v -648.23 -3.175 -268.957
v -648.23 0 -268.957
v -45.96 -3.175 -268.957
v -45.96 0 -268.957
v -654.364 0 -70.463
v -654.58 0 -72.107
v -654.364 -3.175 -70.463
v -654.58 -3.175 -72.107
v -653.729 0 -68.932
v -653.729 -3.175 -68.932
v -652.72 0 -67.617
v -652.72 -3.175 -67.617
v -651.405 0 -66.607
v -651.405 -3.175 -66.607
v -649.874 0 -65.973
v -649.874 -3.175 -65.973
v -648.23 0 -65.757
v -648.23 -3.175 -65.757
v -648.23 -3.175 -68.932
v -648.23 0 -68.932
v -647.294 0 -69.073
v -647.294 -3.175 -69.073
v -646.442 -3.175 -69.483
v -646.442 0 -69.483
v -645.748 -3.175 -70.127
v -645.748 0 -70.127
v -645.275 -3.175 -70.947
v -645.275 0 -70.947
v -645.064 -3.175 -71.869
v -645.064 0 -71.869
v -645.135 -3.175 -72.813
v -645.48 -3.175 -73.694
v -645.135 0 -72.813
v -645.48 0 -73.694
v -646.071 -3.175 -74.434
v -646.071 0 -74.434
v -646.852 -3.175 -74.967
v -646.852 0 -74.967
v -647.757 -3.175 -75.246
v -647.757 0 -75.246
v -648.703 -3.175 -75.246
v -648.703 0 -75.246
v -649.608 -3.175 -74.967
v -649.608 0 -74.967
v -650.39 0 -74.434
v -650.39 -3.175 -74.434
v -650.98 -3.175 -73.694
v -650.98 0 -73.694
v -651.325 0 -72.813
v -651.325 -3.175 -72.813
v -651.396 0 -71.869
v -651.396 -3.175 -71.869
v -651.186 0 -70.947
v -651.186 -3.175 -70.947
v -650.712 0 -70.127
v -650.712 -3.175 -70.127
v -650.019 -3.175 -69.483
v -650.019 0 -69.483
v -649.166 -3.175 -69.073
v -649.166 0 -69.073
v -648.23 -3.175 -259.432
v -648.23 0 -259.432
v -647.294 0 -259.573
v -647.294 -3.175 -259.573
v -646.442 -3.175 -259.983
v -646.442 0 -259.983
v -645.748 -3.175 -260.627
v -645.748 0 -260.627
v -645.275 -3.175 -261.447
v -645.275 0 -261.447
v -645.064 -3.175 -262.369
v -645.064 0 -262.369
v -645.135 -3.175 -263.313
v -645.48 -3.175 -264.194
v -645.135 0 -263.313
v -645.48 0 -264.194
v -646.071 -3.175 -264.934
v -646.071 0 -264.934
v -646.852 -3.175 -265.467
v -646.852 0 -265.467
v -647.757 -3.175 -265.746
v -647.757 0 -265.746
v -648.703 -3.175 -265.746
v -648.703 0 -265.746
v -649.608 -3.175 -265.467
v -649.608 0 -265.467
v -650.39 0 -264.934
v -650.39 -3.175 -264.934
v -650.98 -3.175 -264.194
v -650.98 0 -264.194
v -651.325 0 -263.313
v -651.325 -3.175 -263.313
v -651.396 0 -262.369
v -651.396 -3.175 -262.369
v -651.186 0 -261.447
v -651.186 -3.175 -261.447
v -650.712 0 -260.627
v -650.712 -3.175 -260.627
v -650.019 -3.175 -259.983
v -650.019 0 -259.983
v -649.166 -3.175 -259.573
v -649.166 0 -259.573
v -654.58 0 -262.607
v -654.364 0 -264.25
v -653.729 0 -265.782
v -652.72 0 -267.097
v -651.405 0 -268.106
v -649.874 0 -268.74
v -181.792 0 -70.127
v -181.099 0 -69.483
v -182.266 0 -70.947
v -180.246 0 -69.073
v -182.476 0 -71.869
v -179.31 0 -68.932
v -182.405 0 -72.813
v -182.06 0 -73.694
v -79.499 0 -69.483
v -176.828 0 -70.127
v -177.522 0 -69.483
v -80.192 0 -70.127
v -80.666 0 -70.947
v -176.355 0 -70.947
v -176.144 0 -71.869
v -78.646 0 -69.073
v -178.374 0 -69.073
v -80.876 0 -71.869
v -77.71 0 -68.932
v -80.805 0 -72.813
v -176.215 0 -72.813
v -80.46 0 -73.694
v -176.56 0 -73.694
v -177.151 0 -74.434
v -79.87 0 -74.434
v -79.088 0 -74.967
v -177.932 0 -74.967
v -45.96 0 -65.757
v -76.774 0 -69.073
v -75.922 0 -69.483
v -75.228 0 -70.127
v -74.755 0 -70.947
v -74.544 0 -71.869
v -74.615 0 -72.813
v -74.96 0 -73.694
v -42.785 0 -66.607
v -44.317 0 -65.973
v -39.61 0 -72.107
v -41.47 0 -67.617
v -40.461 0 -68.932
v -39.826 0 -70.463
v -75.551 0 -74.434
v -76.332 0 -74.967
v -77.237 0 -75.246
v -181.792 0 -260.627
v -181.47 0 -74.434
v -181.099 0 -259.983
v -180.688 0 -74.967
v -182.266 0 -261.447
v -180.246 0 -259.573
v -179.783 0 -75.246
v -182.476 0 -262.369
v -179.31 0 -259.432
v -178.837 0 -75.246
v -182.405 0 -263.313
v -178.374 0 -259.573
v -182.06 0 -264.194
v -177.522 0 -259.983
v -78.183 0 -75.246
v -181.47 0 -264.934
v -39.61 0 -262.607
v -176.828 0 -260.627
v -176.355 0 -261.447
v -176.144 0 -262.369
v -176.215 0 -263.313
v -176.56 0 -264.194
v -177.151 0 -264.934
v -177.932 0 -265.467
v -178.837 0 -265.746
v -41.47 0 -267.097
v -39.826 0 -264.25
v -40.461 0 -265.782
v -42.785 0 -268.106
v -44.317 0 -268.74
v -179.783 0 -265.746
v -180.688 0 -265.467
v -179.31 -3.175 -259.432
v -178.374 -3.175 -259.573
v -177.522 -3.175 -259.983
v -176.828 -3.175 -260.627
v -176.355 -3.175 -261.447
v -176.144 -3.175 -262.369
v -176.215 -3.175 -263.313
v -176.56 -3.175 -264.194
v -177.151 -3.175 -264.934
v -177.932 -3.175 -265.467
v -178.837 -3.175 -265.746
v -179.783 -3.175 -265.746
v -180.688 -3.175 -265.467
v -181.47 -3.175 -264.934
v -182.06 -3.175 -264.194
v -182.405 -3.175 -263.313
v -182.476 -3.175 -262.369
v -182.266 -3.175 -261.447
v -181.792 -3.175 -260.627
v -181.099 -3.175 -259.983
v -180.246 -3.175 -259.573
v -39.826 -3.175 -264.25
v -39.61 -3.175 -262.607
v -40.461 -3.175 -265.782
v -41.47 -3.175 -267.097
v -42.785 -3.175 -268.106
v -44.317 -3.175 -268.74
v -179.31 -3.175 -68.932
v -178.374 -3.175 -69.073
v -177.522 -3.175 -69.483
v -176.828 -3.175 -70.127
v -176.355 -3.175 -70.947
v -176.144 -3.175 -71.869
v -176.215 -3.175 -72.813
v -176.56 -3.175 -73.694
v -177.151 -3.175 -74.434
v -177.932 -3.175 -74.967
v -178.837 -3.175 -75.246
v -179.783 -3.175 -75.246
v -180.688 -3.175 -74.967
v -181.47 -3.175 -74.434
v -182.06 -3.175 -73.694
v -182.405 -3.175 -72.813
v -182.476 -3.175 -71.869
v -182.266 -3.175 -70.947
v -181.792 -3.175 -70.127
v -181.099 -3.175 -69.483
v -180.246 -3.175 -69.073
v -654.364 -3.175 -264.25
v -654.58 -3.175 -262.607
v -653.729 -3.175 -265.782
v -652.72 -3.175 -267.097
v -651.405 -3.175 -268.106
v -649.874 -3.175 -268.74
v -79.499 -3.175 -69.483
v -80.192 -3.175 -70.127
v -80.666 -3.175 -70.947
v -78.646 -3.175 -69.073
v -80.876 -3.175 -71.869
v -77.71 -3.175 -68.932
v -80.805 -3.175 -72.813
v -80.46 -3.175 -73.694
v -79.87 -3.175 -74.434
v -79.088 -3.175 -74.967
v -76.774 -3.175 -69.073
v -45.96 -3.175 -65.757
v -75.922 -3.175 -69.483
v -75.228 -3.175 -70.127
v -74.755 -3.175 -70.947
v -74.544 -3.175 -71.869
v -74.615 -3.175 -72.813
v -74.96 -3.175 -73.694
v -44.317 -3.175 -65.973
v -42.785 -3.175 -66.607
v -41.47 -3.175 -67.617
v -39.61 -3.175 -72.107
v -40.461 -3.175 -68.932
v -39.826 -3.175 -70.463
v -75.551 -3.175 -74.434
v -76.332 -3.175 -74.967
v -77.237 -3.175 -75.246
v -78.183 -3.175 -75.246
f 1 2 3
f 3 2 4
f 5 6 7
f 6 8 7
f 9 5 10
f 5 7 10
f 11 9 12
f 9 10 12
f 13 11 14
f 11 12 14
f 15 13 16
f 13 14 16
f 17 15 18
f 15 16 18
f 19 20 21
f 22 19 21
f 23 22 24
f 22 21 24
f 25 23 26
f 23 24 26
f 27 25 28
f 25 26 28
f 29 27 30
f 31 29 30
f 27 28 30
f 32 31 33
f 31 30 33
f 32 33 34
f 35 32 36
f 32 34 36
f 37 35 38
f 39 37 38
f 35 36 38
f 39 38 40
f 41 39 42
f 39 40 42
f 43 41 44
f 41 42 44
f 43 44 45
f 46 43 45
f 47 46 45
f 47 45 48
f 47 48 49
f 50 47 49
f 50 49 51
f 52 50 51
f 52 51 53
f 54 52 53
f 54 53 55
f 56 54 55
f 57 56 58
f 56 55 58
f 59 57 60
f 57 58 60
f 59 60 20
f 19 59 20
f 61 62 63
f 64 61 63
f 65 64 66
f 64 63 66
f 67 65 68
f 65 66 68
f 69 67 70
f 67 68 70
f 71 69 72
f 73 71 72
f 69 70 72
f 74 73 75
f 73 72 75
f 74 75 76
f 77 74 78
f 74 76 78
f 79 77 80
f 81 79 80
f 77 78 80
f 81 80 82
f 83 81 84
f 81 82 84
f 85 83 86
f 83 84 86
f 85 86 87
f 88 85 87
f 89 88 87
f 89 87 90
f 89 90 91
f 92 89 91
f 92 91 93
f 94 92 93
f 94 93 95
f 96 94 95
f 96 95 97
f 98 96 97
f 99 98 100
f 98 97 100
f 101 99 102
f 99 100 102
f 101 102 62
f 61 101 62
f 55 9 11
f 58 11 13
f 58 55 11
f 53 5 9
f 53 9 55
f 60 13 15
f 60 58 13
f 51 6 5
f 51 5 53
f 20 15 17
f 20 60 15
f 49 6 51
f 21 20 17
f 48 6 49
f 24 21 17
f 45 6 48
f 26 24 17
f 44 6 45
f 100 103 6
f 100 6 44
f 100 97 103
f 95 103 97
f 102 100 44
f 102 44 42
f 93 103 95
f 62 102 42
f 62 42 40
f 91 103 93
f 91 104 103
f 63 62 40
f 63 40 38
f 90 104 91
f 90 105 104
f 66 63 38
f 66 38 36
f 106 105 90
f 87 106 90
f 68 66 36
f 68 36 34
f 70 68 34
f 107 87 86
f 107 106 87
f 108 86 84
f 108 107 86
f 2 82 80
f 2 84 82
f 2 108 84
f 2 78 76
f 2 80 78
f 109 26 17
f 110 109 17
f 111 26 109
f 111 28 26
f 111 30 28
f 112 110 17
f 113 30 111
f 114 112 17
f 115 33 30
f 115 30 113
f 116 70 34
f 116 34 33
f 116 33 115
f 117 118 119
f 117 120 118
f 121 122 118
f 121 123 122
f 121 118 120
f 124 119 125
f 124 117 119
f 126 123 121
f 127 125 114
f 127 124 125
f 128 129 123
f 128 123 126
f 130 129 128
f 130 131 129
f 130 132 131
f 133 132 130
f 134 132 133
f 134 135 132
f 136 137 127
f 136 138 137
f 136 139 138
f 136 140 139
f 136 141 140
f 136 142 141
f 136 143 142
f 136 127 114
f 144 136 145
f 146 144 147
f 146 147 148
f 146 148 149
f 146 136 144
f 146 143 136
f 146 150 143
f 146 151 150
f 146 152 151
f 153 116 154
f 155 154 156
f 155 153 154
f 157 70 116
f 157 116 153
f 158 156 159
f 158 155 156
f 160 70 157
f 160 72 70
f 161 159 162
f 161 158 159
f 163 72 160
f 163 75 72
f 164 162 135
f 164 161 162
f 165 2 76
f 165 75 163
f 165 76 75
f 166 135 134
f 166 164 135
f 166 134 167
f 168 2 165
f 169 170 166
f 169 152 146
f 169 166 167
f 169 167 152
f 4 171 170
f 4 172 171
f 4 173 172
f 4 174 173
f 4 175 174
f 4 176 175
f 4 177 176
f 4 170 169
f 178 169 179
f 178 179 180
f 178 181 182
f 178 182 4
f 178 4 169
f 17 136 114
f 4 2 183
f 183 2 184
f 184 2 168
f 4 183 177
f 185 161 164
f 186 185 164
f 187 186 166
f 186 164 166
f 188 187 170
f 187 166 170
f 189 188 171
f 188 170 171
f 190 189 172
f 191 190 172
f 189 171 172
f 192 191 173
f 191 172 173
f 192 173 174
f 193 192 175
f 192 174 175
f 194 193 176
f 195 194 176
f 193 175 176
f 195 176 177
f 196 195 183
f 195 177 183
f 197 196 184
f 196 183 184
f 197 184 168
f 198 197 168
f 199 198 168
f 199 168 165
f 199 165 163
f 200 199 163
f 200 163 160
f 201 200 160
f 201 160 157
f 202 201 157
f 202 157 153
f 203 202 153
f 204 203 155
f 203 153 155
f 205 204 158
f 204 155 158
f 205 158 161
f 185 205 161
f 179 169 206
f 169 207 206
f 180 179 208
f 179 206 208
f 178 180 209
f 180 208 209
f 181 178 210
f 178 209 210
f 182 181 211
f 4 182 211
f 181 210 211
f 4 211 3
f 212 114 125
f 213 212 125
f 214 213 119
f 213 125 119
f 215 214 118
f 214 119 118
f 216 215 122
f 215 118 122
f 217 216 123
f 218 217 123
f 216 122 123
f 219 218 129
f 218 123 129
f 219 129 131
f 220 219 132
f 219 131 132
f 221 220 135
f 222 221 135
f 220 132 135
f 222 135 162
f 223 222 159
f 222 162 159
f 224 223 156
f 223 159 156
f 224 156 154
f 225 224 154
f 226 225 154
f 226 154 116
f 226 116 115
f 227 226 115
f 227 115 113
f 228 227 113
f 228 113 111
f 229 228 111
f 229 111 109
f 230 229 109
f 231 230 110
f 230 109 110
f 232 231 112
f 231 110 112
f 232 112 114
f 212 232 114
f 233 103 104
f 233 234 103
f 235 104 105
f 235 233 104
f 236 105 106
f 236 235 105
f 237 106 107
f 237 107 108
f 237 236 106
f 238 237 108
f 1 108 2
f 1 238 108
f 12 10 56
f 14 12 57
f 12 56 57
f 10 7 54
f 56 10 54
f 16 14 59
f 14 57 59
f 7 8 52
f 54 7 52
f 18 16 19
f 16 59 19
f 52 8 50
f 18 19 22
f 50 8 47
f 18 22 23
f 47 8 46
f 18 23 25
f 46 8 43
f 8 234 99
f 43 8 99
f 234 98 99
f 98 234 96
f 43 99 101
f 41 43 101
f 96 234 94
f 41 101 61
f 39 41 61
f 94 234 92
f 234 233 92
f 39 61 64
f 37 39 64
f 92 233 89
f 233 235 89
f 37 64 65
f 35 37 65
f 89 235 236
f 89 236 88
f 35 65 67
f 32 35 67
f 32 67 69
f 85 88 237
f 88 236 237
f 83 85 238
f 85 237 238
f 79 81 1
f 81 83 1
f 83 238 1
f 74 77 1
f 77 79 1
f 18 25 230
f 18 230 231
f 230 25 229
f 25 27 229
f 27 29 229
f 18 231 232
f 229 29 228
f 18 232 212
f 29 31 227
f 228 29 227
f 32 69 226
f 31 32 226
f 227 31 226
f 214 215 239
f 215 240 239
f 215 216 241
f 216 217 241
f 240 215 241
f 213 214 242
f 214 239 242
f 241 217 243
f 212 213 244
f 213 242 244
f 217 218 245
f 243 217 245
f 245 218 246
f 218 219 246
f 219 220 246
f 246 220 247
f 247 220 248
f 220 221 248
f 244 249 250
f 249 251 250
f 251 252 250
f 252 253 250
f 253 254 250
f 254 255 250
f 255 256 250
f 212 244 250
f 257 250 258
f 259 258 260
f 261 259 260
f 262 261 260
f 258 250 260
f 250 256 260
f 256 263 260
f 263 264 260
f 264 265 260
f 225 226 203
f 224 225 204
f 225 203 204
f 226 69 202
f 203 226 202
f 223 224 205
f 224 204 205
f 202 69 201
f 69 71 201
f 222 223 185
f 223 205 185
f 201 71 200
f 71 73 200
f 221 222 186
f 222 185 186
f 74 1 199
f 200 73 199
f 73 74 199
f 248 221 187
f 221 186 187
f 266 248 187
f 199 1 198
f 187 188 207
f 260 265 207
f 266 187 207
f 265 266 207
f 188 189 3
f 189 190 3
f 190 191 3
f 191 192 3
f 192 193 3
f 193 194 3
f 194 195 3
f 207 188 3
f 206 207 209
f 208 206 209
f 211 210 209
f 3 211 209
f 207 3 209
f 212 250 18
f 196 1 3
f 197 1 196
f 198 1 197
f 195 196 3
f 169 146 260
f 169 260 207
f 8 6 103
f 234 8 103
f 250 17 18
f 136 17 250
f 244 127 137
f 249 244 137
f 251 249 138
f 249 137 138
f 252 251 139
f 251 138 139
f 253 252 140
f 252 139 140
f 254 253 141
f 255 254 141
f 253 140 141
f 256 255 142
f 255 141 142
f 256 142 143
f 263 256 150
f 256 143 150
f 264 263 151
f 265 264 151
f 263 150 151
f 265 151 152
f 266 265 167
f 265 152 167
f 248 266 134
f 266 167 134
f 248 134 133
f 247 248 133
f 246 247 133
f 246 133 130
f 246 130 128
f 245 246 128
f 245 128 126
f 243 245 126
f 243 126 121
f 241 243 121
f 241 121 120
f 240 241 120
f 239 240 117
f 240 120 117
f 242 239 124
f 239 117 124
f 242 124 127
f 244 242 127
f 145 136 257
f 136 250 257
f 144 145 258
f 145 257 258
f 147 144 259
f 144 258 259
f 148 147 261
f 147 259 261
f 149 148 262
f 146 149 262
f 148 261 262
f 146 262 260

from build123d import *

# Parameters (mm, degrees)
SKETCH1_W           = 614.97
SKETCH1_H           = 203.2
SKETCH1_R           = 3.175
BOSS_EXTRUDE1_DEPTH = 3.175
FILLET1_R           = 6.35


with BuildPart() as part:
    # Sketch1 → Boss-Extrude1 (new body)
    with BuildSketch(Plane(origin=(0, 0, 0), x_dir=(1, 0, 0), z_dir=(0, 1, 0))):
        with Locations((-347.095055786, 167.356642248)):
            Rectangle(SKETCH1_W, SKETCH1_H)
        with Locations(Location((-77.710055786, 72.106642248, 0), (0, 0, 270))):
            Circle(SKETCH1_R, mode=Mode.SUBTRACT)
        with Locations(Location((-179.310055786, 262.606642248, 0), (0, 0, 270))):
            Circle(SKETCH1_R, mode=Mode.SUBTRACT)
        with Locations(Location((-179.310055786, 72.106642248, 0), (0, 0, 270))):
            Circle(SKETCH1_R, mode=Mode.SUBTRACT)
        with Locations((-45.960055786, 72.106642248)):
            Circle(SKETCH1_R, mode=Mode.SUBTRACT)
        with Locations((-45.960055786, 262.606642248)):
            Circle(SKETCH1_R, mode=Mode.SUBTRACT)
        with Locations(Location((-648.230055786, 72.106642248, 0), (0, 0, 270))):
            Circle(SKETCH1_R, mode=Mode.SUBTRACT)
        with Locations(Location((-648.230055786, 262.606642248, 0), (0, 0, 270))):
            Circle(SKETCH1_R, mode=Mode.SUBTRACT)
        with Locations((-45.960055786, 72.106642248)):
            Circle(SKETCH1_R)
        with Locations((-45.960055786, 262.606642248)):
            Circle(SKETCH1_R)
    extrude(amount=-BOSS_EXTRUDE1_DEPTH)

    # Fillet1
    fillet1_edges = [part.edges().sort_by_distance(p)[0] for p in [
        (-654.580055786, -1.5875, -65.756642248),
        (-654.580055786, -1.5875, -268.956642248),
        (-39.610055786, -1.5875, -268.956642248),
        (-39.610055786, -1.5875, -65.756642248),
    ]]
    fillet(fillet1_edges, radius=FILLET1_R)


solid = part.part
